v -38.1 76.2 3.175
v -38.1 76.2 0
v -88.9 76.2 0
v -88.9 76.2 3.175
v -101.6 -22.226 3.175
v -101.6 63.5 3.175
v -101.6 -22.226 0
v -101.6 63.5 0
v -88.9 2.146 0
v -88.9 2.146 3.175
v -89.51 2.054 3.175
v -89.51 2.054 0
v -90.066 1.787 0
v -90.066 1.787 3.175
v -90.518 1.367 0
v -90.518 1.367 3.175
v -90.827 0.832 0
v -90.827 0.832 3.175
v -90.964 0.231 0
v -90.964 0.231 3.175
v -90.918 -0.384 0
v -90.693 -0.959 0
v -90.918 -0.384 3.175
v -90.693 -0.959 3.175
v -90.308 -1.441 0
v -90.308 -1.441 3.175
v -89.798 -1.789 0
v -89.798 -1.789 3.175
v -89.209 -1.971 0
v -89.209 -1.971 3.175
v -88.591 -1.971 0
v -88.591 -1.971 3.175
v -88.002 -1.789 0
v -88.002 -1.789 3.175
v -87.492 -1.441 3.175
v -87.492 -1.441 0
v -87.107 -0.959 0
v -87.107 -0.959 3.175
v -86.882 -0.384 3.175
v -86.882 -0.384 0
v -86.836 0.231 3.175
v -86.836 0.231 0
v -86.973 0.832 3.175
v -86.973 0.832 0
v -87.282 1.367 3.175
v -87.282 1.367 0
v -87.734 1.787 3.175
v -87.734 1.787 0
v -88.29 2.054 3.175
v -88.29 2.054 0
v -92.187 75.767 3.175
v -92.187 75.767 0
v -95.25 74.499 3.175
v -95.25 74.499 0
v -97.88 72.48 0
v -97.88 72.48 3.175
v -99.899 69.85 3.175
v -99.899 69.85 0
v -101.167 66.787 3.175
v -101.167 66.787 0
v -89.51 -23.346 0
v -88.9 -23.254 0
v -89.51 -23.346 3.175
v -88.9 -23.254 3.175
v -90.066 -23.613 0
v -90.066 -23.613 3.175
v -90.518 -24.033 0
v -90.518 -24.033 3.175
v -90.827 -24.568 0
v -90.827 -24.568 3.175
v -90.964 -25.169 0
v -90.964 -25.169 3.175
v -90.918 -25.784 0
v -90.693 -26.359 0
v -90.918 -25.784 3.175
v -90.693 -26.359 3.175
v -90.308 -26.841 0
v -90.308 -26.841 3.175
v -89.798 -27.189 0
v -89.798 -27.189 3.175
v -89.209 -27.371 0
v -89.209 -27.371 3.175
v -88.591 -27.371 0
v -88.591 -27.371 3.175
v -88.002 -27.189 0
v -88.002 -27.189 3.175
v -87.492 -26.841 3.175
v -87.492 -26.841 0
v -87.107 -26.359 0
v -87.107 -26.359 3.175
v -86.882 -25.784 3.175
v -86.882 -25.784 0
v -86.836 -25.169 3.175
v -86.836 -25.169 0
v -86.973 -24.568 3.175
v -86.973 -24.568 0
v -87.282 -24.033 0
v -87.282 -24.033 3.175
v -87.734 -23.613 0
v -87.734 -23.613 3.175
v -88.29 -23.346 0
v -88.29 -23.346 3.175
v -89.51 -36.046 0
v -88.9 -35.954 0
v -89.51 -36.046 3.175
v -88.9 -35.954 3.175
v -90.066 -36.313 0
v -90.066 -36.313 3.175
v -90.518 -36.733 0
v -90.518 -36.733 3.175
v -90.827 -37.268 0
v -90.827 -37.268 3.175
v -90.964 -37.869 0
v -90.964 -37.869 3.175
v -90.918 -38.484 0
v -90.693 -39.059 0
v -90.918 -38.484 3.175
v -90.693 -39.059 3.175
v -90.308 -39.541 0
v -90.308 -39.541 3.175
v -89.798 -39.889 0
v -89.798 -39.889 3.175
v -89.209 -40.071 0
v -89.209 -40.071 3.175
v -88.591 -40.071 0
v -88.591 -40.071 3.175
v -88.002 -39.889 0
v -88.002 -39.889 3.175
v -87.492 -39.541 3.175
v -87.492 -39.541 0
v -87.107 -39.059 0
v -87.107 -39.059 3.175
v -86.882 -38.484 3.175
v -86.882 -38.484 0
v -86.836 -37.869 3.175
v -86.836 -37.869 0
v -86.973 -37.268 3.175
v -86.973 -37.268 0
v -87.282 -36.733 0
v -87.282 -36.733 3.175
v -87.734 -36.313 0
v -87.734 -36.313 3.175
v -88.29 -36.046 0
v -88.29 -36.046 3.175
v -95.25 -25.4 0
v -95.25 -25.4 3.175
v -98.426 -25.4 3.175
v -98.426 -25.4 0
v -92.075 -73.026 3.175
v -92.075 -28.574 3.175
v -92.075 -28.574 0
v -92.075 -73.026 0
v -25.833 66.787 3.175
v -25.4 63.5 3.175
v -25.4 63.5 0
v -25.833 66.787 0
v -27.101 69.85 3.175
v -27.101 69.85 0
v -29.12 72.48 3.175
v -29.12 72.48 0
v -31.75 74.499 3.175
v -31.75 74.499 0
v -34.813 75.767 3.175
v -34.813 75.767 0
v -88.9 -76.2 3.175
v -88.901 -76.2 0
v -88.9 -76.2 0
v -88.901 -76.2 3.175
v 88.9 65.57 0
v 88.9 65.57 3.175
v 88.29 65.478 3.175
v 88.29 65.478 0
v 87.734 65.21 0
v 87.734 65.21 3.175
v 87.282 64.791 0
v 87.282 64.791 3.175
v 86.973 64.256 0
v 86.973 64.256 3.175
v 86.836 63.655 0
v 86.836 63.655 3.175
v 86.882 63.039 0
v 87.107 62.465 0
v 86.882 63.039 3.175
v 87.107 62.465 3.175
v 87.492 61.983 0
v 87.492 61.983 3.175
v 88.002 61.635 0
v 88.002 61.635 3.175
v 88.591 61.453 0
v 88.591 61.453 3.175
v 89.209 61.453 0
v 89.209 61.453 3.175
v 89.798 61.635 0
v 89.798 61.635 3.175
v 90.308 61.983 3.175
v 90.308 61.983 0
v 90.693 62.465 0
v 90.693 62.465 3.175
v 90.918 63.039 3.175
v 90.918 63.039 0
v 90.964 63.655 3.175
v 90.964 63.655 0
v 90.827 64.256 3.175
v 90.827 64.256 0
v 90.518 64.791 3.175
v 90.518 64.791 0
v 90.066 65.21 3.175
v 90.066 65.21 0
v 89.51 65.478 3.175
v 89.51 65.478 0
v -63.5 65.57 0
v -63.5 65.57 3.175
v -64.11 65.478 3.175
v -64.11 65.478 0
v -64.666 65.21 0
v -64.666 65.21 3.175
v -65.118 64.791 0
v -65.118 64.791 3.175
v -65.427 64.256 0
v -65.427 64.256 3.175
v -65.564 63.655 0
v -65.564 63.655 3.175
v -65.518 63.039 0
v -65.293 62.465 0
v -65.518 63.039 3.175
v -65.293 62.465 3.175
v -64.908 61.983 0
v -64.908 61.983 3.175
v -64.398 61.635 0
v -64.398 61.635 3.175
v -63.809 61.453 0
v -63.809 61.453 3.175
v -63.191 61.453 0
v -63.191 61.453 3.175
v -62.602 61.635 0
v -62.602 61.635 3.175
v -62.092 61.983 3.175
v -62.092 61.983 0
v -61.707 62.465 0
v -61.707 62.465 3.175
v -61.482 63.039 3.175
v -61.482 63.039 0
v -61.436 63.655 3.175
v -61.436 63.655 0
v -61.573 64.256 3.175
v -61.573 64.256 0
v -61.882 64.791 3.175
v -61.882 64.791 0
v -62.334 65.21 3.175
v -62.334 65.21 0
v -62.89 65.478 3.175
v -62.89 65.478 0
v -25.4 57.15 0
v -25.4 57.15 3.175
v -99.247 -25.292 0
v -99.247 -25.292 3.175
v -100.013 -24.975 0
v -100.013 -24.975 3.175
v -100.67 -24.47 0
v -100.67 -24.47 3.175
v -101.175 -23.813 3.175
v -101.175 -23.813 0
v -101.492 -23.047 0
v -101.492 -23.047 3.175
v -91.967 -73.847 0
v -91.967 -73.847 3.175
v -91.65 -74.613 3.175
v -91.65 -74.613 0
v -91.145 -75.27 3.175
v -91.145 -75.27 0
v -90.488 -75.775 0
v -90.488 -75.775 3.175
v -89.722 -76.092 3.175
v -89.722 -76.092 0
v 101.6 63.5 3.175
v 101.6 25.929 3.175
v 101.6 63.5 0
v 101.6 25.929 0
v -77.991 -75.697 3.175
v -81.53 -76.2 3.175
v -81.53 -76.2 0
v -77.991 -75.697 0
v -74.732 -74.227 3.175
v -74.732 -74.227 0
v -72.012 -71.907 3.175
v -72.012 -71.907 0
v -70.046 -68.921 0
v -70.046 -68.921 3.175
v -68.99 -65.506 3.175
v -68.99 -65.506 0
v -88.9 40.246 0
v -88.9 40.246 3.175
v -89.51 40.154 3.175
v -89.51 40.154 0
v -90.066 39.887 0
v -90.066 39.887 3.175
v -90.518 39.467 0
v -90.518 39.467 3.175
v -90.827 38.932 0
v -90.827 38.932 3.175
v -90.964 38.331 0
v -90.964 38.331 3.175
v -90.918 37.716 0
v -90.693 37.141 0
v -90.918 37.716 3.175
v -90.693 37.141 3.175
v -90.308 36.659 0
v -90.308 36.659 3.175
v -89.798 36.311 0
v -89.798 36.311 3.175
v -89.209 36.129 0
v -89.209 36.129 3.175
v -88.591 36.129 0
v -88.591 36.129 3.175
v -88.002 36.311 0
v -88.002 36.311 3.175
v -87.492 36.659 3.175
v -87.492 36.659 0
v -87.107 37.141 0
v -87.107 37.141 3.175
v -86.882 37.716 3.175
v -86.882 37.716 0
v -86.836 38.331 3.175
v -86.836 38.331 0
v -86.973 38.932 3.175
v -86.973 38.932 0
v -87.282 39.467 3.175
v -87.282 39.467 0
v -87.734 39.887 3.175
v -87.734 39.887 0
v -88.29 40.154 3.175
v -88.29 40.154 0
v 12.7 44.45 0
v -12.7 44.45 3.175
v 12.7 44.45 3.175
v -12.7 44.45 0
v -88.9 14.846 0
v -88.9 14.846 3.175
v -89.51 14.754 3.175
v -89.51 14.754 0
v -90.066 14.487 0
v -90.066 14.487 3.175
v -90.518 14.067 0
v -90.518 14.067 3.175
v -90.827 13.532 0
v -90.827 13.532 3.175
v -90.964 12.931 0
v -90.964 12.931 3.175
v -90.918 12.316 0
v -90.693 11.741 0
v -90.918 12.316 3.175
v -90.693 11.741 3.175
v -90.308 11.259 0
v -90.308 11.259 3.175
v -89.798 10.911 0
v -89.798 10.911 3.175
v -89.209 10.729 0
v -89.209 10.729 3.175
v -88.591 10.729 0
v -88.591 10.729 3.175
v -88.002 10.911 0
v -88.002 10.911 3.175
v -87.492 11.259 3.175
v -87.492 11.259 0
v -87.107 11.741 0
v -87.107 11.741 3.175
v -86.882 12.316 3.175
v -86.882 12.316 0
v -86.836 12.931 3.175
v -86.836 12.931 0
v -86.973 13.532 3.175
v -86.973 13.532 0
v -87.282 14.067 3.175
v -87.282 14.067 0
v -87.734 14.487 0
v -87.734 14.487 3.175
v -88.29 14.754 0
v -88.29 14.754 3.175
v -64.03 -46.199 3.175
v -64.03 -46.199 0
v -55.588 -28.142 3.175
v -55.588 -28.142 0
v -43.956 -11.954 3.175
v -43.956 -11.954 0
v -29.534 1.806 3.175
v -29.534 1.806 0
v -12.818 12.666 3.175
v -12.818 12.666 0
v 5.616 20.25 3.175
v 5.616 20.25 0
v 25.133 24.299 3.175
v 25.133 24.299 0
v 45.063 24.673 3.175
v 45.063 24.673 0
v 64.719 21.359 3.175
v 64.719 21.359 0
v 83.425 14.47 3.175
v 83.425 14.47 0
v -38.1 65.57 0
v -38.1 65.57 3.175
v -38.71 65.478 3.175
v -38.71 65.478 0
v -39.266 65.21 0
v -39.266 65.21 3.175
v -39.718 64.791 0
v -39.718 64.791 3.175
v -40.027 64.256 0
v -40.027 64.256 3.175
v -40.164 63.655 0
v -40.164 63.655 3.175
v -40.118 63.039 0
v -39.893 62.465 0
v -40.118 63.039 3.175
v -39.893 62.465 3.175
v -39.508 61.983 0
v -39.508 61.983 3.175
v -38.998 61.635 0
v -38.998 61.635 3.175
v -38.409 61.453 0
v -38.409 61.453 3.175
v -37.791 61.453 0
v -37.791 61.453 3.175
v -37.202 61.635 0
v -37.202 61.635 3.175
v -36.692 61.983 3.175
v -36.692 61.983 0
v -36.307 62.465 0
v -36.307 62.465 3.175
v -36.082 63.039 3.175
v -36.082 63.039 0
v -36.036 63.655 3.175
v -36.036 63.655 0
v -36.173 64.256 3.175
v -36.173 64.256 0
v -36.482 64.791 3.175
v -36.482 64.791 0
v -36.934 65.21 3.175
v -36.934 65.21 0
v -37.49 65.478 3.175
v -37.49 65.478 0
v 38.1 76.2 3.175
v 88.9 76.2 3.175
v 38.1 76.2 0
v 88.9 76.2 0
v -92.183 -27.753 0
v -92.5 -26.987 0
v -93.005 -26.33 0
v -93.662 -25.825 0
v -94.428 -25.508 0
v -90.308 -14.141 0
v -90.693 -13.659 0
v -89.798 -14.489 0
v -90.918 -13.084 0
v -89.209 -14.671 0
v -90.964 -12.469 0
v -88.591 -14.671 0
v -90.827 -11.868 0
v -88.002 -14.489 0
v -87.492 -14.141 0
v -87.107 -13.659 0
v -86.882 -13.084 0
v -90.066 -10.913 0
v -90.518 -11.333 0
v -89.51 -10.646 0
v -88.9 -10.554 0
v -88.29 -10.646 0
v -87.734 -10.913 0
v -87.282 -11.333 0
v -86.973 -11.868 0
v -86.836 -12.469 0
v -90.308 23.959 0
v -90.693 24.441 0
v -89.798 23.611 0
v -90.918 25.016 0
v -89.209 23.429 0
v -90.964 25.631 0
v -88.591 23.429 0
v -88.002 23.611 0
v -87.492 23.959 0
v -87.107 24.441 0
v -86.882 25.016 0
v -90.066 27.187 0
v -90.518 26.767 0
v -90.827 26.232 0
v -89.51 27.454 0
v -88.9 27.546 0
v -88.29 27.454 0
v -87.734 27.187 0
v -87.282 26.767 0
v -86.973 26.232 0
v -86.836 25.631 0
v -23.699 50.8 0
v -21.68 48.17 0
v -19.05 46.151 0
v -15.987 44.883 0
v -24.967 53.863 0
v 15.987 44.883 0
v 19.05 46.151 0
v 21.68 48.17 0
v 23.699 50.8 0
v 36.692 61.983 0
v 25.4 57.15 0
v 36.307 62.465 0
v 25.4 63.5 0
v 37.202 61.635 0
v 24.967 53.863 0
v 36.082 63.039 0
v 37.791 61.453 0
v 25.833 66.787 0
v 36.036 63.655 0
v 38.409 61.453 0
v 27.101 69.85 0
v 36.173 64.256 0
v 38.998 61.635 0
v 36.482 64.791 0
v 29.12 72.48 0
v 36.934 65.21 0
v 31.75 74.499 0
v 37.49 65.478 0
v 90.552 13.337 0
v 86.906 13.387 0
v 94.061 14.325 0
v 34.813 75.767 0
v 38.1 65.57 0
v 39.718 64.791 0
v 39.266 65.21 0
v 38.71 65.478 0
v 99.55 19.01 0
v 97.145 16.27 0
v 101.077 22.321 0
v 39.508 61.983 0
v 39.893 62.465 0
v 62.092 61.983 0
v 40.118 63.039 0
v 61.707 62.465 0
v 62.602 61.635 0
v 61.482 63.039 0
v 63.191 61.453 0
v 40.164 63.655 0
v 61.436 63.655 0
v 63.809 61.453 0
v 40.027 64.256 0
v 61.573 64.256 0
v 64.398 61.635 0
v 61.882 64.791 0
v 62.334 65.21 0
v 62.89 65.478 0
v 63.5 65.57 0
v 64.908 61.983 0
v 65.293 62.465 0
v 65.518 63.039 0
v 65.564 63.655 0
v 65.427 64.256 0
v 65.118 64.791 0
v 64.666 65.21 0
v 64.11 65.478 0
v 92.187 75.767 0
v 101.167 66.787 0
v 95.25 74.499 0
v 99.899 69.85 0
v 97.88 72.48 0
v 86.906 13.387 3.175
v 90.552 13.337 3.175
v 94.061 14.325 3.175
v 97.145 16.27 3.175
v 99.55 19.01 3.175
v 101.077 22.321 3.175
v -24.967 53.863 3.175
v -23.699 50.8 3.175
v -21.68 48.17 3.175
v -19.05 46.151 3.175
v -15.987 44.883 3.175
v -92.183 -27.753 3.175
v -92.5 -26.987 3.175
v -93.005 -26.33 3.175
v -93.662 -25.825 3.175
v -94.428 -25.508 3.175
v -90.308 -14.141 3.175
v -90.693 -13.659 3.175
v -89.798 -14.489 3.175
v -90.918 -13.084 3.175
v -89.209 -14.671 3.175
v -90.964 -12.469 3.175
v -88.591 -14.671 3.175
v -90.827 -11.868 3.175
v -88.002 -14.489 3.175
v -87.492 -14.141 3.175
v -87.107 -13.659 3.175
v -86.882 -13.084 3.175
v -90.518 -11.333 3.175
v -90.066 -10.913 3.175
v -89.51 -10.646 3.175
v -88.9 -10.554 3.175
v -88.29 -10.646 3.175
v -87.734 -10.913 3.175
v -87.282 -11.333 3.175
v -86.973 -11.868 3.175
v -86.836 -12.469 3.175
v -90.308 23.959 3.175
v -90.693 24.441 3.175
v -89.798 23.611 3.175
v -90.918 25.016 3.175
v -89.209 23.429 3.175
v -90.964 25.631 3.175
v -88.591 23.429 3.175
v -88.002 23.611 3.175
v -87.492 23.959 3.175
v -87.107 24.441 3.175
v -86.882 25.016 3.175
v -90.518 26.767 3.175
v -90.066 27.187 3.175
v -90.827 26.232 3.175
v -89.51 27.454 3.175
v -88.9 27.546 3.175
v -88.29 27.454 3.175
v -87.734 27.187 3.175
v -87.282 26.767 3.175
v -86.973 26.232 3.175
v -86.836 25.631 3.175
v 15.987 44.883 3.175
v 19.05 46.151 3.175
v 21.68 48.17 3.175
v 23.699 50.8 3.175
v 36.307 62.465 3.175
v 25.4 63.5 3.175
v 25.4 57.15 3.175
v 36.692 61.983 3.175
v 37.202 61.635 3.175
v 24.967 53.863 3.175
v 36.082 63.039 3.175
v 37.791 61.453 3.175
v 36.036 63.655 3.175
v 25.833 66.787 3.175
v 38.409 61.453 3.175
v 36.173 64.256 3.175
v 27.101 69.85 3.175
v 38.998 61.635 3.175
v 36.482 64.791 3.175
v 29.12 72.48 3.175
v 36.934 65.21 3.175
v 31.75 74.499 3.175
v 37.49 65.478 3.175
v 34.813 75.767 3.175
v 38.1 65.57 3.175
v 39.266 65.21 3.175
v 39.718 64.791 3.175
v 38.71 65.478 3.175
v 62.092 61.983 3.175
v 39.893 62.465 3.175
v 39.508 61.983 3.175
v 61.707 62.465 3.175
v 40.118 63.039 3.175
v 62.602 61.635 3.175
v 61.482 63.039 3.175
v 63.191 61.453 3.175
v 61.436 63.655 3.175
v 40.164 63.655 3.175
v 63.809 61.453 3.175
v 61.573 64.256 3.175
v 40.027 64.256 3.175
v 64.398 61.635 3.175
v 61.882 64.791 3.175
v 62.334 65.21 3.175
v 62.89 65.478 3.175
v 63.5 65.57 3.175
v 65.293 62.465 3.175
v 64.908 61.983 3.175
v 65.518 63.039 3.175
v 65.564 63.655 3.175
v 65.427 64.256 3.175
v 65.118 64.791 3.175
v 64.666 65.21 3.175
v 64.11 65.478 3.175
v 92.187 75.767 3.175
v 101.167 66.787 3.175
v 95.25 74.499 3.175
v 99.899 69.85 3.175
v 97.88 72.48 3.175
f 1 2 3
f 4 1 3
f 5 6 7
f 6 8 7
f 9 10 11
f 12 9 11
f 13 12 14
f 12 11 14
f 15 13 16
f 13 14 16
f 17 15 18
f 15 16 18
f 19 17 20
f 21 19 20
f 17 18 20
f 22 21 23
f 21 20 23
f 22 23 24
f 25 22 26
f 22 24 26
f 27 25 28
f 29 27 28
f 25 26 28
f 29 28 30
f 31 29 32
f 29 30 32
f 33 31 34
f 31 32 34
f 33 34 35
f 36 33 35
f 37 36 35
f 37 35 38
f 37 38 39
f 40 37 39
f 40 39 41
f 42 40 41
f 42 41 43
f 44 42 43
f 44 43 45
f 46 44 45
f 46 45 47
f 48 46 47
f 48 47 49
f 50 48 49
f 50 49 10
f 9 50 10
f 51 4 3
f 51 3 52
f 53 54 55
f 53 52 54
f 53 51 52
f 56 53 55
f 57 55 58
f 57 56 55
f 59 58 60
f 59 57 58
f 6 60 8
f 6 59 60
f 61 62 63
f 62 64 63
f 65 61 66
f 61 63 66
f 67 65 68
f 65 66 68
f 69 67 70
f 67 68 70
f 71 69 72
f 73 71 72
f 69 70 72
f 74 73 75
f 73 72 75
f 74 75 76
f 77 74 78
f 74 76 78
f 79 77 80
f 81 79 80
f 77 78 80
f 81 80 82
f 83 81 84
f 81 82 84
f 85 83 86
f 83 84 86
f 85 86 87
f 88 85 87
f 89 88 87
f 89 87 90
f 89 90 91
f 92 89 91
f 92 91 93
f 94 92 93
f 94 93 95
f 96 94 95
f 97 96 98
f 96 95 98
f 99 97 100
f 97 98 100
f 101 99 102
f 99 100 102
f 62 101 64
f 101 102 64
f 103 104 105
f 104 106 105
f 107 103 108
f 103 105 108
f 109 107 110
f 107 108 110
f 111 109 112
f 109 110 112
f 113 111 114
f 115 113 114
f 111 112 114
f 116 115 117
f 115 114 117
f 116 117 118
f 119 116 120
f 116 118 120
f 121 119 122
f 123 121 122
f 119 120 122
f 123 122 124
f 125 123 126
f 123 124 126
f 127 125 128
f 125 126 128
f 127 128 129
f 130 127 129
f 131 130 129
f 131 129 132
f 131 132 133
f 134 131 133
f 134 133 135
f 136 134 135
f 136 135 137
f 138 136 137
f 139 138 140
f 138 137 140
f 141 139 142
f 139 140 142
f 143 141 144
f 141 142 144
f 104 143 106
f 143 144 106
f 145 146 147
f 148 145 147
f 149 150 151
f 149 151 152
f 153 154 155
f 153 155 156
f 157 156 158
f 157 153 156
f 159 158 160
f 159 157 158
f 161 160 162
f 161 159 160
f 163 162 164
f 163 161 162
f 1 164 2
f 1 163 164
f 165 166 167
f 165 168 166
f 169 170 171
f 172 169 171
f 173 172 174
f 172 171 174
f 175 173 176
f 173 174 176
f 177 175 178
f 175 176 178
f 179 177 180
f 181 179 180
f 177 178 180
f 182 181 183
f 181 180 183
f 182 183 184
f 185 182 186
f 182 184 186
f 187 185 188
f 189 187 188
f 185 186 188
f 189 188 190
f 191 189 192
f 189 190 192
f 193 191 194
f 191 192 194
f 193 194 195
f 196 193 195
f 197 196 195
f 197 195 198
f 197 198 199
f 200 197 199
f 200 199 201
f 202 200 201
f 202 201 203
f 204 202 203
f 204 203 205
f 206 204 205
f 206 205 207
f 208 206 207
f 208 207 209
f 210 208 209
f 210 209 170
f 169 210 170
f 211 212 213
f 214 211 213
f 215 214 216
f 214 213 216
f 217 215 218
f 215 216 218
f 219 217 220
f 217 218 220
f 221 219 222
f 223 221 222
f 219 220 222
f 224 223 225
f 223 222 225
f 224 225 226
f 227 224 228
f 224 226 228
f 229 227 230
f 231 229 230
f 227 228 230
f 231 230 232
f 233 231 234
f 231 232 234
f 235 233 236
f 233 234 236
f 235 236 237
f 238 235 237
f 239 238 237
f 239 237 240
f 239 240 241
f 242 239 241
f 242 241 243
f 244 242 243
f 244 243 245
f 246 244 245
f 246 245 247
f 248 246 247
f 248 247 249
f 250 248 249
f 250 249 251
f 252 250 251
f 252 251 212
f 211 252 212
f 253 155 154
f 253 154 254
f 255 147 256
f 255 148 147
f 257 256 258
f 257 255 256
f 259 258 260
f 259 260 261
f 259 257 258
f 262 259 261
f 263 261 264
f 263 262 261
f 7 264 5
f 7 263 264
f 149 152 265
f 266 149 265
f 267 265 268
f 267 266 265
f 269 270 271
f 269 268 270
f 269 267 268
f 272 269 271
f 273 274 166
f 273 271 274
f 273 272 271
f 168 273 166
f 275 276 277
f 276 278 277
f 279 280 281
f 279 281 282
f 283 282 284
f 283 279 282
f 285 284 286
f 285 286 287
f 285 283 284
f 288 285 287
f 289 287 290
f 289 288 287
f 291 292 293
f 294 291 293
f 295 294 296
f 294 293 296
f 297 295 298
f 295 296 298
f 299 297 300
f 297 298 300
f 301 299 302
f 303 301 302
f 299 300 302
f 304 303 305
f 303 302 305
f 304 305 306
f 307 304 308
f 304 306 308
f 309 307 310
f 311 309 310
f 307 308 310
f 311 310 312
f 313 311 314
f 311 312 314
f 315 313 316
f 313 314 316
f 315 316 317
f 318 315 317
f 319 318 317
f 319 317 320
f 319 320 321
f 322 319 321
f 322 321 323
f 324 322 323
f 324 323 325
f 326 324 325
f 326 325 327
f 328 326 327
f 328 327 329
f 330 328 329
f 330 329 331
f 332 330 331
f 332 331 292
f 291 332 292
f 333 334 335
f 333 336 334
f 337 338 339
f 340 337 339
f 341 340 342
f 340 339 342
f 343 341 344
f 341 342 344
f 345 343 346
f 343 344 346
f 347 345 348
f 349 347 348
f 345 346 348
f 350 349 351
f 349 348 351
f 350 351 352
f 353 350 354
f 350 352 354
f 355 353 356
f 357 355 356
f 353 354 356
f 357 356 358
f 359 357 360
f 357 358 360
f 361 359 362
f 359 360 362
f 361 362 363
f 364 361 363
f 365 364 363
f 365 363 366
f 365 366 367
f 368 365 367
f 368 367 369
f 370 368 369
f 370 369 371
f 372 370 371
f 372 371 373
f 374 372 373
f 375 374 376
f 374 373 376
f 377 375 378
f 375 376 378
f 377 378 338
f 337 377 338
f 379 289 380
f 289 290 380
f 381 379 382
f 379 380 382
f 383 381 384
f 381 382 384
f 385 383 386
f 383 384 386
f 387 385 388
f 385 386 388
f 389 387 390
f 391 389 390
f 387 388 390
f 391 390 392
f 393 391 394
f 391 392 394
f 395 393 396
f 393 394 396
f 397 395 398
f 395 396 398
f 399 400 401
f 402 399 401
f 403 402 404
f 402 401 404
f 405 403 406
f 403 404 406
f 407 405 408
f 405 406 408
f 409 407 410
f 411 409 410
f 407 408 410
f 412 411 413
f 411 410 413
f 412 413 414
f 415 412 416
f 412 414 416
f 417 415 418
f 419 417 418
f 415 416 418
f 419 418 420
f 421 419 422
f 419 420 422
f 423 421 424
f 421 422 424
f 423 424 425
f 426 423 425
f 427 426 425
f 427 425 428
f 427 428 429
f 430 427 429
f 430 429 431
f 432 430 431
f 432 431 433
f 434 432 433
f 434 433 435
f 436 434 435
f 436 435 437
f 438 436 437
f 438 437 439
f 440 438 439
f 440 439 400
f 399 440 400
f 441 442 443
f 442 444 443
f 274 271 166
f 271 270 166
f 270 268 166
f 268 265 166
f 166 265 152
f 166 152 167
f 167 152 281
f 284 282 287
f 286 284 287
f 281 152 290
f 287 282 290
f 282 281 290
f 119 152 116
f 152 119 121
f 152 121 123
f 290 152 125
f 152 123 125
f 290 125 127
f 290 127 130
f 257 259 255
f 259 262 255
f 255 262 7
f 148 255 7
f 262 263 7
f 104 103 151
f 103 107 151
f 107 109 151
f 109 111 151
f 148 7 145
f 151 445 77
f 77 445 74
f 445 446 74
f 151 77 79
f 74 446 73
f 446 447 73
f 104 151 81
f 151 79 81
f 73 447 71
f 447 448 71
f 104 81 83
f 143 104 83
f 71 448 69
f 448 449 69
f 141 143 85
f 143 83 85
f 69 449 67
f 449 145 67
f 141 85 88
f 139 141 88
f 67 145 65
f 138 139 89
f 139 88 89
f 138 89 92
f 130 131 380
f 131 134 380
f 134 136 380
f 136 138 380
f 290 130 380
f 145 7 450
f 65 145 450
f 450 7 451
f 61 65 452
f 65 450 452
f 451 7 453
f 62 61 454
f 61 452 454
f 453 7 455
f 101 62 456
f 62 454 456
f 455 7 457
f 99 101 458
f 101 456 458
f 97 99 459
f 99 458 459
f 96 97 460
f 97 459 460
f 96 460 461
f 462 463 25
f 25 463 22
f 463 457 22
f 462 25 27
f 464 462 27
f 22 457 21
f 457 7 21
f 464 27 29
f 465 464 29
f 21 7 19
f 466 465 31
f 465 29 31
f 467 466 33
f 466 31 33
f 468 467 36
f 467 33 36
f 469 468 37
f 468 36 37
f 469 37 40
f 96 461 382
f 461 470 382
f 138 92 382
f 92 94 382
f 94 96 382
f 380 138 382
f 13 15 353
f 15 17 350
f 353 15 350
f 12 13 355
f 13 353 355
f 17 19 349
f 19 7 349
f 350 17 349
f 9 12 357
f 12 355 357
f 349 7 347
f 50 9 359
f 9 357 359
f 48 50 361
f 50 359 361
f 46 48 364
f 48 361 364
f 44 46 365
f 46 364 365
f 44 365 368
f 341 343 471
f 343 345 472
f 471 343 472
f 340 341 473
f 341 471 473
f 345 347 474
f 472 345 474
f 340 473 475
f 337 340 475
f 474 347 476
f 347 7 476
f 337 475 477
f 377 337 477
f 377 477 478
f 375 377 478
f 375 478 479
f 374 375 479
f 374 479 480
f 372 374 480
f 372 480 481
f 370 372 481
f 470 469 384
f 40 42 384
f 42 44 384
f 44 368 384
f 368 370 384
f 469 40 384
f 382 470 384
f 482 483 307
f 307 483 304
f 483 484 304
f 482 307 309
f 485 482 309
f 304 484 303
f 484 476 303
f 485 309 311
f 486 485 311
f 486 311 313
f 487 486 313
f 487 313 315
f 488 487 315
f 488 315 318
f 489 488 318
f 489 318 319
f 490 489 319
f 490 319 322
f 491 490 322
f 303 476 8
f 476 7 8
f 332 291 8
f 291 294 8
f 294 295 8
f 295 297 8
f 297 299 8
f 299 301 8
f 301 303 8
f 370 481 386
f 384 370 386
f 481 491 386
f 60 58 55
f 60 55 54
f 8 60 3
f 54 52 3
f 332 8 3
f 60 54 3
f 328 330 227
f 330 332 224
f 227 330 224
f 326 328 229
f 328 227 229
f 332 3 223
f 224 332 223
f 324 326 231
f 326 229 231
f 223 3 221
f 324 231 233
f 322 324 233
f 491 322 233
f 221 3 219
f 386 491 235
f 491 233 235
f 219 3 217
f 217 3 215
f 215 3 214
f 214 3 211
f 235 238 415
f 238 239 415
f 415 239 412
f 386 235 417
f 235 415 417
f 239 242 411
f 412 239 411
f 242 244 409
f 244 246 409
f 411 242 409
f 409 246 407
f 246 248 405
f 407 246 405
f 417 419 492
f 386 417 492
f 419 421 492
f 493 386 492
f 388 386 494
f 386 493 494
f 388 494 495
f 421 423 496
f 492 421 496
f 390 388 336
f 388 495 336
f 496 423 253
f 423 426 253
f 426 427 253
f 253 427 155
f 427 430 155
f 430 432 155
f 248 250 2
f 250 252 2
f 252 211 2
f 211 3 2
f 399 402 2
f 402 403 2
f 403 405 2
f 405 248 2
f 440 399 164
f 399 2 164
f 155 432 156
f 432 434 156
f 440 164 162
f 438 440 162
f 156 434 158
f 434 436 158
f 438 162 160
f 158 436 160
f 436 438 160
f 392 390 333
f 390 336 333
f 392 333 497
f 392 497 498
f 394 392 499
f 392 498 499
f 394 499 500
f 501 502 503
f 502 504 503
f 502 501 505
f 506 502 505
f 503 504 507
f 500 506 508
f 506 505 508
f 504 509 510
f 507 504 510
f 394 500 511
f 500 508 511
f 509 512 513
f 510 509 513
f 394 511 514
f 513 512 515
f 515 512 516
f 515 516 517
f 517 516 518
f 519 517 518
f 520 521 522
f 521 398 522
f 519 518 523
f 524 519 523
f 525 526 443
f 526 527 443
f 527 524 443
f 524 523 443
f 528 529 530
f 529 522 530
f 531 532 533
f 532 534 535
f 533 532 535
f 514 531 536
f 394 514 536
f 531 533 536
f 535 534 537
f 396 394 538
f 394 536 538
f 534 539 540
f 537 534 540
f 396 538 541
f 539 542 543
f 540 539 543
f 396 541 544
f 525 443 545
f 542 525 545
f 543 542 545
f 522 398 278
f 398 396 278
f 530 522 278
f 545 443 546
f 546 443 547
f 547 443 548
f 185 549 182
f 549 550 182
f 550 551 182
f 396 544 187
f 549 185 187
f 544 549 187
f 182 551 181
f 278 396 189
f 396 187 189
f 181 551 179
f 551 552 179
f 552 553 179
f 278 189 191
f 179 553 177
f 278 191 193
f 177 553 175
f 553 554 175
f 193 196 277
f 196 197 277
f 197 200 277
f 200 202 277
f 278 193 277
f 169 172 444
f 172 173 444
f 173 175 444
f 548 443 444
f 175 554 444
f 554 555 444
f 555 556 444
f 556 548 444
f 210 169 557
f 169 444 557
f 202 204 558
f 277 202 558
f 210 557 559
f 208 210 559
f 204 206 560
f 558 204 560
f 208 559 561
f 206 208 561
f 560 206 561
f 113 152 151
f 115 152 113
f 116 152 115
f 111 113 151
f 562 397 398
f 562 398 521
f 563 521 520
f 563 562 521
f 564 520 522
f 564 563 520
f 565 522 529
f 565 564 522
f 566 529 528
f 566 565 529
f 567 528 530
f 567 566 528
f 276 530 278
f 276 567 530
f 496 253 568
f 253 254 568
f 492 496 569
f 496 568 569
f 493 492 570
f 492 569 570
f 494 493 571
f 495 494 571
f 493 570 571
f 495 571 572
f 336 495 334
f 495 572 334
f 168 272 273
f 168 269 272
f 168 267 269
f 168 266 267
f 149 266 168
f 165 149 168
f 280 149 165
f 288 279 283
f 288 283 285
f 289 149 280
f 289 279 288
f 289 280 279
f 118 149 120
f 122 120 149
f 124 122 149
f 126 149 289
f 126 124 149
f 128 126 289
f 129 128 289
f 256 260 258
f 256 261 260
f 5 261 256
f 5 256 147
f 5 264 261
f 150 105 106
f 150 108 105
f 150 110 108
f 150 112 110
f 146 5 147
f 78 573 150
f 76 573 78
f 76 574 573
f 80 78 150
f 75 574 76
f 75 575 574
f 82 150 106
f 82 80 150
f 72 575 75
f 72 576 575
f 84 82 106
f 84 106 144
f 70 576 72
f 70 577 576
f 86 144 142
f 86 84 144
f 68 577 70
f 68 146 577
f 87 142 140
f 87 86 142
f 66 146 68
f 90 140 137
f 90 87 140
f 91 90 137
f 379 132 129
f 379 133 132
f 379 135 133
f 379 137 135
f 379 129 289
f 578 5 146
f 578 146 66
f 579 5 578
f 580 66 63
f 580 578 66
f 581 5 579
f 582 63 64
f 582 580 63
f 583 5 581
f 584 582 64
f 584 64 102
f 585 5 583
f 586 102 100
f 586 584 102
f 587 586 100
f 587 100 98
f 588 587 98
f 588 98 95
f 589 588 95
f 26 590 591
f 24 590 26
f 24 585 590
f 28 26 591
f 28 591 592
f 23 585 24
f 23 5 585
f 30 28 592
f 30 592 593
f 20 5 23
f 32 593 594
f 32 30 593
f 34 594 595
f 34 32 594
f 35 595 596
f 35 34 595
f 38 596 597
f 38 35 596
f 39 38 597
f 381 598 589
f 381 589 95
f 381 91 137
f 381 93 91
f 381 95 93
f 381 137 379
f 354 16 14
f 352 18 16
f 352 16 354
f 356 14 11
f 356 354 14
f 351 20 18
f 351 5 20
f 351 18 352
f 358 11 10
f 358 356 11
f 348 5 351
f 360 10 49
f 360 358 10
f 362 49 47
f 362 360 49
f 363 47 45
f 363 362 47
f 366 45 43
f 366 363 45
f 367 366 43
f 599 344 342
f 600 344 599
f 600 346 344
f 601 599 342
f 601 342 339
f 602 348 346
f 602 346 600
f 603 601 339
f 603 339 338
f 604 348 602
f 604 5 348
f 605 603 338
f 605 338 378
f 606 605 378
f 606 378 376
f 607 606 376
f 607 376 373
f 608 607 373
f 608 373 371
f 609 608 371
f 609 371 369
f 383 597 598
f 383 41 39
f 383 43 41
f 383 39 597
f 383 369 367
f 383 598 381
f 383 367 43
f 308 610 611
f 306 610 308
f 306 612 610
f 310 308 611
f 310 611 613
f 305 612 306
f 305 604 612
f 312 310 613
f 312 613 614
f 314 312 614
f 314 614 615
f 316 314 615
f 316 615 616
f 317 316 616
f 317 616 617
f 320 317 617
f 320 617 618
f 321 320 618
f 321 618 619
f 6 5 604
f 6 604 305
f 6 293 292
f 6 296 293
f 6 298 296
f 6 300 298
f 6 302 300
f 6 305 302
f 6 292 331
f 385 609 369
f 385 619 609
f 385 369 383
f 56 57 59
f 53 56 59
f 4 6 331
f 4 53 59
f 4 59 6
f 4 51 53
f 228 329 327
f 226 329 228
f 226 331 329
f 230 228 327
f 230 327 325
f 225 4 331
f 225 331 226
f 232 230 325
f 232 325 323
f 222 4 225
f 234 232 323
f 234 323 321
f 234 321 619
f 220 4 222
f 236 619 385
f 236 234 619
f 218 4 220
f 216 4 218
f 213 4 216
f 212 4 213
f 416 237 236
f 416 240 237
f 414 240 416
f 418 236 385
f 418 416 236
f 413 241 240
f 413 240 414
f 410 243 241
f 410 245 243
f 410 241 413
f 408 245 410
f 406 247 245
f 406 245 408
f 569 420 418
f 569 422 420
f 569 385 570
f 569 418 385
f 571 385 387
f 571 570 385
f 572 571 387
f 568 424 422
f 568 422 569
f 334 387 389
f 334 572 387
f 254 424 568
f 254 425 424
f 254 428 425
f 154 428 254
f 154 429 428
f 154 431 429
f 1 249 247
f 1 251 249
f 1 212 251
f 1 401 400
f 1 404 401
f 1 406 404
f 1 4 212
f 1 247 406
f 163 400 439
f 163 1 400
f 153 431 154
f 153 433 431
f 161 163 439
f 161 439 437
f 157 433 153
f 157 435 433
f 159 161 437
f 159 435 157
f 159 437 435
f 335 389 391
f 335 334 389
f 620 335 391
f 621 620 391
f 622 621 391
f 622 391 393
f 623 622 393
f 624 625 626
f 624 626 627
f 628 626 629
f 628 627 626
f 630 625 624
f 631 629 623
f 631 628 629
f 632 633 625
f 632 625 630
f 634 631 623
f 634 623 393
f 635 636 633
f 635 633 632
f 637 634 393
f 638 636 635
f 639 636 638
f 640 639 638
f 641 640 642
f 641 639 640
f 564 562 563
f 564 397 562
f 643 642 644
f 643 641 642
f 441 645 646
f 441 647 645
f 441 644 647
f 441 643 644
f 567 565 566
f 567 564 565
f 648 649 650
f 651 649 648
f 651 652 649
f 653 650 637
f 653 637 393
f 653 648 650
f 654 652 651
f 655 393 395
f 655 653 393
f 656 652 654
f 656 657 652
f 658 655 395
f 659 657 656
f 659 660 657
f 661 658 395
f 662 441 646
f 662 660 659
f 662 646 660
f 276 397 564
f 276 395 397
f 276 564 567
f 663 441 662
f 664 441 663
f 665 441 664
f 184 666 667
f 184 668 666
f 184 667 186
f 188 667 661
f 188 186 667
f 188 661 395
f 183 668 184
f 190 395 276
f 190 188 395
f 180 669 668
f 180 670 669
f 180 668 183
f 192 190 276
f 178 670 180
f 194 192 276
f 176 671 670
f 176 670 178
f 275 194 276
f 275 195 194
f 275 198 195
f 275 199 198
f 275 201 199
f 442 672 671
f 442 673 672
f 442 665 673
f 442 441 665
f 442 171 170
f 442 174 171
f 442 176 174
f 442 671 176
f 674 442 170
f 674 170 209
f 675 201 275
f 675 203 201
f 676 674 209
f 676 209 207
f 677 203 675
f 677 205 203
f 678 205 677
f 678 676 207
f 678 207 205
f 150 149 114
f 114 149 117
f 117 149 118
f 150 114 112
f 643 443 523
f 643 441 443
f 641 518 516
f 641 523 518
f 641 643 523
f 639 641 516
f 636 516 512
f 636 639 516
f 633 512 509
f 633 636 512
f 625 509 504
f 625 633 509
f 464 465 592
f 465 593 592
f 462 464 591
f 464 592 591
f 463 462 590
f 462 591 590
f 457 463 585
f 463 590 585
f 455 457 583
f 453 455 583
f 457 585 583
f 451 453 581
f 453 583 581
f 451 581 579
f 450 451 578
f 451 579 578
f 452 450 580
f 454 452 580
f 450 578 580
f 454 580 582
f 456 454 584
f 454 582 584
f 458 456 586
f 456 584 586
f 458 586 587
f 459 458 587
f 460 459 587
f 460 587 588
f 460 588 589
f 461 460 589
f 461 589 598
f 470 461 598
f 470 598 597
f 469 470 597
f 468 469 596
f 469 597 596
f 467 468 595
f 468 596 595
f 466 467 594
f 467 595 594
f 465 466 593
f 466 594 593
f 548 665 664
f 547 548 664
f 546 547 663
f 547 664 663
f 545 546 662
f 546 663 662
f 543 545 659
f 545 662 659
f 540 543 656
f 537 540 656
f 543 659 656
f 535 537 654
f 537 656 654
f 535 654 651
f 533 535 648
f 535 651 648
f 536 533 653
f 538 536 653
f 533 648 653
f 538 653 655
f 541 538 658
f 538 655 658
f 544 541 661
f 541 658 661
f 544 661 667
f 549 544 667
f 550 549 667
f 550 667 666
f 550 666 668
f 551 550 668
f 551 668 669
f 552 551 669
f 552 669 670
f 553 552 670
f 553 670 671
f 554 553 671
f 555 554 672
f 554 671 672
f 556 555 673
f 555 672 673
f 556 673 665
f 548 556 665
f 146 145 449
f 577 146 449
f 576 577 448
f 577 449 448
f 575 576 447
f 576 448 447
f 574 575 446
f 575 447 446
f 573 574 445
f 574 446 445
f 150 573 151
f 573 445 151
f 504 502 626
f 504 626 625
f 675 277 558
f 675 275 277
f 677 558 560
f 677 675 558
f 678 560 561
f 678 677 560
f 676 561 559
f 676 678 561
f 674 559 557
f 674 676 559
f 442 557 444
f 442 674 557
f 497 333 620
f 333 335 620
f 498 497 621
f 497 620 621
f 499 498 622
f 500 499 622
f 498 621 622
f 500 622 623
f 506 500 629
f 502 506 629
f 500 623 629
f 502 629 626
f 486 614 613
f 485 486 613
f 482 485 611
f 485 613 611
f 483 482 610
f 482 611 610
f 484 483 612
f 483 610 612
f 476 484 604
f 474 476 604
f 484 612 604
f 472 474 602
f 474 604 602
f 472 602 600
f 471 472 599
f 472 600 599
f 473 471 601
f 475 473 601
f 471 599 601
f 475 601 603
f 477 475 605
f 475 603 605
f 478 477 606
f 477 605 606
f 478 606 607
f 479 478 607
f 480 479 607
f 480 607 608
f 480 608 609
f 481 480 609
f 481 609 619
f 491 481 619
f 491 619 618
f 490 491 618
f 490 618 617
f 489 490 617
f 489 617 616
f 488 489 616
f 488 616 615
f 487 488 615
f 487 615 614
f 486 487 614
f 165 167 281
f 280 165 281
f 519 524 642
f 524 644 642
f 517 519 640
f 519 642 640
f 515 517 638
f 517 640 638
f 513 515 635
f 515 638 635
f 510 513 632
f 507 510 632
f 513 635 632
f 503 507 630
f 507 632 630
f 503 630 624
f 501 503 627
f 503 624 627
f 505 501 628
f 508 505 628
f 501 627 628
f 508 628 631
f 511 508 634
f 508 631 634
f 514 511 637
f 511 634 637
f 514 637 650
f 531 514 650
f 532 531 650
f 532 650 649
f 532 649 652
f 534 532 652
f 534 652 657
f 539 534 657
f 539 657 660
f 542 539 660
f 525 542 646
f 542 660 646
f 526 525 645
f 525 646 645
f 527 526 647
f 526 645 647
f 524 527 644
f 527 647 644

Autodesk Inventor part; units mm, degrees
ref_plane "YZ Plane" through (0, 0, 0) normal (1, 0, 0) x (0, 1, 0)
ref_plane "XZ Plane" through (0, 0, 0) normal (0, 1, 0) x (-1, 0, 0)
ref_plane "XY Plane" through (0, 0, 0) normal (0, 0, 1) x (1, 0, 0)
sketch "Sketch1" plane through (0, 0, 0) normal (0, 0, 1) x (1, 0, 0)
  line L0 (-101.6, -76.2) -> (101.6, -76.2)
  line L1 (101.6, -76.2) -> (101.6, 76.2)
  line L2 (101.6, 76.2) -> (-101.6, 76.2)
  line L3 (-101.6, 76.2) -> (-101.6, -76.2)
  line L4 (-101.6, -76.2) -> (101.6, 76.2) construction
  line L5 (101.6, -76.2) -> (-101.6, 76.2) construction
  point P0 (0, 0)
  dimension "d0" = 152.4
  dimension "d1" = 203.2
extrude "Extrusion1" add sketch "Sketch1" along normal blind 3.175
sketch "Sketch2" plane through (0, 0, 0) normal (0, 0, -1) x (-1, 0, 0)
  circle A0 centre (-37.1038, -82.4738) radius 101.092
  circle A1 centre (-37.1038, -82.4738) radius 107.442
  line L0 (-101.6, -76.2) -> (-101.6, 76.2) projected
  line L1 (-101.6, 3.4565) -> (-101.6, -76.2)
  line L2 (-101.6, -76.2) -> (70.1549, -76.2)
  line L3 (101.6, -76.2) -> (-101.6, -76.2) projected
  point P0 (0, 0)
  dimension "d4" = 214.884
extrude "Extrusion2" cut sketch "Sketch2" against normal blind 25.4 contours L2 L0 A0 | A0 L0 A1 L2 picked at (8.0579, -71.6086) picked at (67.4292, -71.4153)
fillet "Fillet1" radius 12.7 5 edges at (101.6, 76.2, 1.5875) (-101.6, 76.2, 1.5875) (-101.6, -76.2, 1.5875) (-70.1549, -76.2, 1.5875) (101.6, 3.4565, 1.5875)
sketch "Sketch3" plane through (0, 0, 0) normal (0, 0, -1) x (-1, 0, 0)
  line L0 (76.2027, 73.1012) -> (-660.4, 73.1012) projected
  line L1 (-660.4, 53.8988) -> (76.2027, 53.8988) projected
  circle A0 centre (-647.7, 63.5) radius 2.0701 projected
  circle A1 centre (-622.3, 63.5) radius 2.0701 projected
  circle A2 centre (-596.9, 63.5) radius 2.0701 projected
  circle A3 centre (-571.5, 63.5) radius 2.0701 projected
  circle A4 centre (-546.1, 63.5) radius 2.0701 projected
  circle A5 centre (-520.7, 63.5) radius 2.0701 projected
  circle A6 centre (-495.3, 63.5) radius 2.0701 projected
  circle A7 centre (-469.9, 63.5) radius 2.0701 projected
  circle A8 centre (-444.5, 63.5) radius 2.0701 projected
  circle A9 centre (-419.1, 63.5) radius 2.0701 projected
  circle A10 centre (-393.7, 63.5) radius 2.0701 projected
  circle A11 centre (-368.3, 63.5) radius 2.0701 projected
  circle A12 centre (-342.9, 63.5) radius 2.0701 projected
  circle A13 centre (-317.5, 63.5) radius 2.0701 projected
  circle A14 centre (-292.1, 63.5) radius 2.0701 projected
  circle A15 centre (-266.7, 63.5) radius 2.0701 projected
  circle A16 centre (-241.3, 63.5) radius 2.0701 projected
  circle A17 centre (-215.9, 63.5) radius 2.0701 projected
  circle A18 centre (-190.5, 63.5) radius 2.0701 projected
  circle A19 centre (-165.1, 63.5) radius 2.0701 projected
  circle A20 centre (-139.7, 63.5) radius 2.0701 projected
  circle A21 centre (-114.3, 63.5) radius 2.0701 projected
  circle A22 centre (-88.9, 63.5) radius 2.0701 projected
  circle A23 centre (-63.5, 63.5) radius 2.0701 projected
  circle A24 centre (-38.1, 63.5) radius 2.0701 projected
  circle A25 centre (-12.7, 63.5) radius 2.0701 projected
  circle A26 centre (12.7, 63.5) radius 2.0701 projected
  circle A27 centre (38.1, 63.5) radius 2.0701 projected
  circle A28 centre (63.5, 63.5) radius 2.0701 projected
  line L2 (97.2058, -44.2468) -> (78.359, -44.2468) projected
  line L3 (78.359, -44.2468) -> (76.2, -42.0878) projected
  line L4 (76.2, 16.8402) -> (76.2, -42.0878) projected
  line L5 (76.2, 16.8402) -> (78.359, 18.9992) projected
  line L6 (97.2058, 18.9992) -> (78.359, 18.9992) projected
  line L7 (97.2058, -44.2468) -> (97.2058, 18.9992) projected
  circle A29 centre (88.9, 12.7762) radius 2.0701 projected
  circle A30 centre (88.9, 0.0762) radius 2.0701 projected
  circle A31 centre (88.9, -12.6238) radius 2.0701 projected
  circle A32 centre (88.9, -25.3238) radius 2.0701 projected
  circle A33 centre (88.9, -38.0238) radius 2.0701 projected
  line L8 (76.2027, 73.1012) -> (76.2027, 53.8988) projected
  line L9 (-660.4, 53.8988) -> (-660.4, 73.1012) projected
  point P0 (0, 0)
  point P1 (88.9, 25.4762)
  point P2 (88.9, 38.1762)
  dimension "d17" = 12.7
hole "Hole1" at (88.9, 63.5, 0) at (63.5, 63.5, 0) at (38.1, 63.5, 0) at (12.7, 63.5, 0) at (-12.7, 63.5, 0) at (-38.1, 63.5, 0) at (-63.5, 63.5, 0) at (-88.9, 12.7762, 0) at (-88.9, 0.0762, 0) at (-88.9, -12.6238, 0) at (-88.9, -25.3238, 0) at (-88.9, -38.0238, 0) at (-88.9, 25.4762, 0) at (-88.9, 38.1762, 0) direction (0, 0, 1) diameter 4.1402 end through all
sketch "Sketch4" plane through (0, 0, 0) normal (0, 0, -1) x (-1, 0, 0)
  line L0 (-88.9, 76.2) -> (88.9, 76.2) projected
  line L1 (-25.4, 76.2) -> (25.4, 76.2)
  line L2 (25.4, 76.2) -> (25.4, 44.45)
  line L3 (25.4, 44.45) -> (-25.4, 44.45)
  line L4 (-25.4, 44.45) -> (-25.4, 76.2)
  line L5 (-101.6, 25.9294) -> (-101.6, 63.5) projected
  point P0 (0, 0)
  dimension "d23" = 31.75
  dimension "d24" = 50.8
  dimension "d25" = 76.2
extrude "Extrusion3" cut sketch "Sketch4" against normal through all
fillet "Fillet2" radius 12.7 4 edges at (25.4, 76.2, 1.5875) (25.4, 44.45, 1.5875) (-25.4, 44.45, 1.5875) (-25.4, 76.2, 1.5875)
sketch "Sketch5" plane through (0, 0, 3.175) normal (0, 0, 1) x (1, 0, 0)
  line L0 (-76.2, -76.1238) -> (-76.2, -25.4) projected
  line L1 (-76.2, -25.4) -> (-88.8238, -25.4) projected
  line L2 (-88.8238, -25.4) -> (-88.9, -25.4762) projected
  line L3 (-88.9, -25.4762) -> (-88.9762, -25.4) projected
  line L4 (-88.9762, -25.4) -> (-101.6, -25.4) projected
  line L5 (-101.6, -25.4) -> (-101.6, -76.1238) projected
  line L6 (-76.2, -76.1238) -> (-101.6, -76.1238) projected
  line L7 (-78.74, -27.94) -> (-78.74, -73.66) projected
  line L8 (-78.74, -73.66) -> (-99.06, -73.66) projected
  line L9 (-99.06, -73.66) -> (-99.06, -27.94) projected
  line L10 (-99.06, -27.94) -> (-78.74, -27.94) projected
  line L11 (-92.71, -31.75) -> (-92.71, -34.925) projected
  line L12 (-92.71, -31.75) -> (-99.06, -31.75) projected
  line L13 (-92.71, -66.675) -> (-92.71, -34.925) projected
  line L14 (-92.71, -66.675) -> (-92.71, -69.85) projected
  line L15 (-101.6, -25.4) -> (-92.075, -25.4)
  line L16 (-92.075, -25.4) -> (-92.075, -76.1238)
  line L17 (-92.075, -76.1238) -> (-101.6, -76.1238)
  line L18 (-101.6, -76.1238) -> (-101.6, -25.4)
  circle A0 centre (-88.9, -38.0238) radius 2.0701 projected
  point P0 (0, 0)
  point P1 (-88.9, -76.2)
  dimension "d35" = 0.635
extrude "Extrusion4" cut sketch "Sketch5" against normal through all contours L6 L5 L4 L16 L10 L9 L8 | L8 L9 L10 L16
fillet "Fillet3" radius 3.175 3 edges at (-101.6, -25.4, 1.5875) (-92.075, -25.4, 1.5875) (-92.075, -75.7967, 1.5875)
properties part number "C13R1_TK_UpperFrameSupportWheel" material "Polycarbonate, Clear"
